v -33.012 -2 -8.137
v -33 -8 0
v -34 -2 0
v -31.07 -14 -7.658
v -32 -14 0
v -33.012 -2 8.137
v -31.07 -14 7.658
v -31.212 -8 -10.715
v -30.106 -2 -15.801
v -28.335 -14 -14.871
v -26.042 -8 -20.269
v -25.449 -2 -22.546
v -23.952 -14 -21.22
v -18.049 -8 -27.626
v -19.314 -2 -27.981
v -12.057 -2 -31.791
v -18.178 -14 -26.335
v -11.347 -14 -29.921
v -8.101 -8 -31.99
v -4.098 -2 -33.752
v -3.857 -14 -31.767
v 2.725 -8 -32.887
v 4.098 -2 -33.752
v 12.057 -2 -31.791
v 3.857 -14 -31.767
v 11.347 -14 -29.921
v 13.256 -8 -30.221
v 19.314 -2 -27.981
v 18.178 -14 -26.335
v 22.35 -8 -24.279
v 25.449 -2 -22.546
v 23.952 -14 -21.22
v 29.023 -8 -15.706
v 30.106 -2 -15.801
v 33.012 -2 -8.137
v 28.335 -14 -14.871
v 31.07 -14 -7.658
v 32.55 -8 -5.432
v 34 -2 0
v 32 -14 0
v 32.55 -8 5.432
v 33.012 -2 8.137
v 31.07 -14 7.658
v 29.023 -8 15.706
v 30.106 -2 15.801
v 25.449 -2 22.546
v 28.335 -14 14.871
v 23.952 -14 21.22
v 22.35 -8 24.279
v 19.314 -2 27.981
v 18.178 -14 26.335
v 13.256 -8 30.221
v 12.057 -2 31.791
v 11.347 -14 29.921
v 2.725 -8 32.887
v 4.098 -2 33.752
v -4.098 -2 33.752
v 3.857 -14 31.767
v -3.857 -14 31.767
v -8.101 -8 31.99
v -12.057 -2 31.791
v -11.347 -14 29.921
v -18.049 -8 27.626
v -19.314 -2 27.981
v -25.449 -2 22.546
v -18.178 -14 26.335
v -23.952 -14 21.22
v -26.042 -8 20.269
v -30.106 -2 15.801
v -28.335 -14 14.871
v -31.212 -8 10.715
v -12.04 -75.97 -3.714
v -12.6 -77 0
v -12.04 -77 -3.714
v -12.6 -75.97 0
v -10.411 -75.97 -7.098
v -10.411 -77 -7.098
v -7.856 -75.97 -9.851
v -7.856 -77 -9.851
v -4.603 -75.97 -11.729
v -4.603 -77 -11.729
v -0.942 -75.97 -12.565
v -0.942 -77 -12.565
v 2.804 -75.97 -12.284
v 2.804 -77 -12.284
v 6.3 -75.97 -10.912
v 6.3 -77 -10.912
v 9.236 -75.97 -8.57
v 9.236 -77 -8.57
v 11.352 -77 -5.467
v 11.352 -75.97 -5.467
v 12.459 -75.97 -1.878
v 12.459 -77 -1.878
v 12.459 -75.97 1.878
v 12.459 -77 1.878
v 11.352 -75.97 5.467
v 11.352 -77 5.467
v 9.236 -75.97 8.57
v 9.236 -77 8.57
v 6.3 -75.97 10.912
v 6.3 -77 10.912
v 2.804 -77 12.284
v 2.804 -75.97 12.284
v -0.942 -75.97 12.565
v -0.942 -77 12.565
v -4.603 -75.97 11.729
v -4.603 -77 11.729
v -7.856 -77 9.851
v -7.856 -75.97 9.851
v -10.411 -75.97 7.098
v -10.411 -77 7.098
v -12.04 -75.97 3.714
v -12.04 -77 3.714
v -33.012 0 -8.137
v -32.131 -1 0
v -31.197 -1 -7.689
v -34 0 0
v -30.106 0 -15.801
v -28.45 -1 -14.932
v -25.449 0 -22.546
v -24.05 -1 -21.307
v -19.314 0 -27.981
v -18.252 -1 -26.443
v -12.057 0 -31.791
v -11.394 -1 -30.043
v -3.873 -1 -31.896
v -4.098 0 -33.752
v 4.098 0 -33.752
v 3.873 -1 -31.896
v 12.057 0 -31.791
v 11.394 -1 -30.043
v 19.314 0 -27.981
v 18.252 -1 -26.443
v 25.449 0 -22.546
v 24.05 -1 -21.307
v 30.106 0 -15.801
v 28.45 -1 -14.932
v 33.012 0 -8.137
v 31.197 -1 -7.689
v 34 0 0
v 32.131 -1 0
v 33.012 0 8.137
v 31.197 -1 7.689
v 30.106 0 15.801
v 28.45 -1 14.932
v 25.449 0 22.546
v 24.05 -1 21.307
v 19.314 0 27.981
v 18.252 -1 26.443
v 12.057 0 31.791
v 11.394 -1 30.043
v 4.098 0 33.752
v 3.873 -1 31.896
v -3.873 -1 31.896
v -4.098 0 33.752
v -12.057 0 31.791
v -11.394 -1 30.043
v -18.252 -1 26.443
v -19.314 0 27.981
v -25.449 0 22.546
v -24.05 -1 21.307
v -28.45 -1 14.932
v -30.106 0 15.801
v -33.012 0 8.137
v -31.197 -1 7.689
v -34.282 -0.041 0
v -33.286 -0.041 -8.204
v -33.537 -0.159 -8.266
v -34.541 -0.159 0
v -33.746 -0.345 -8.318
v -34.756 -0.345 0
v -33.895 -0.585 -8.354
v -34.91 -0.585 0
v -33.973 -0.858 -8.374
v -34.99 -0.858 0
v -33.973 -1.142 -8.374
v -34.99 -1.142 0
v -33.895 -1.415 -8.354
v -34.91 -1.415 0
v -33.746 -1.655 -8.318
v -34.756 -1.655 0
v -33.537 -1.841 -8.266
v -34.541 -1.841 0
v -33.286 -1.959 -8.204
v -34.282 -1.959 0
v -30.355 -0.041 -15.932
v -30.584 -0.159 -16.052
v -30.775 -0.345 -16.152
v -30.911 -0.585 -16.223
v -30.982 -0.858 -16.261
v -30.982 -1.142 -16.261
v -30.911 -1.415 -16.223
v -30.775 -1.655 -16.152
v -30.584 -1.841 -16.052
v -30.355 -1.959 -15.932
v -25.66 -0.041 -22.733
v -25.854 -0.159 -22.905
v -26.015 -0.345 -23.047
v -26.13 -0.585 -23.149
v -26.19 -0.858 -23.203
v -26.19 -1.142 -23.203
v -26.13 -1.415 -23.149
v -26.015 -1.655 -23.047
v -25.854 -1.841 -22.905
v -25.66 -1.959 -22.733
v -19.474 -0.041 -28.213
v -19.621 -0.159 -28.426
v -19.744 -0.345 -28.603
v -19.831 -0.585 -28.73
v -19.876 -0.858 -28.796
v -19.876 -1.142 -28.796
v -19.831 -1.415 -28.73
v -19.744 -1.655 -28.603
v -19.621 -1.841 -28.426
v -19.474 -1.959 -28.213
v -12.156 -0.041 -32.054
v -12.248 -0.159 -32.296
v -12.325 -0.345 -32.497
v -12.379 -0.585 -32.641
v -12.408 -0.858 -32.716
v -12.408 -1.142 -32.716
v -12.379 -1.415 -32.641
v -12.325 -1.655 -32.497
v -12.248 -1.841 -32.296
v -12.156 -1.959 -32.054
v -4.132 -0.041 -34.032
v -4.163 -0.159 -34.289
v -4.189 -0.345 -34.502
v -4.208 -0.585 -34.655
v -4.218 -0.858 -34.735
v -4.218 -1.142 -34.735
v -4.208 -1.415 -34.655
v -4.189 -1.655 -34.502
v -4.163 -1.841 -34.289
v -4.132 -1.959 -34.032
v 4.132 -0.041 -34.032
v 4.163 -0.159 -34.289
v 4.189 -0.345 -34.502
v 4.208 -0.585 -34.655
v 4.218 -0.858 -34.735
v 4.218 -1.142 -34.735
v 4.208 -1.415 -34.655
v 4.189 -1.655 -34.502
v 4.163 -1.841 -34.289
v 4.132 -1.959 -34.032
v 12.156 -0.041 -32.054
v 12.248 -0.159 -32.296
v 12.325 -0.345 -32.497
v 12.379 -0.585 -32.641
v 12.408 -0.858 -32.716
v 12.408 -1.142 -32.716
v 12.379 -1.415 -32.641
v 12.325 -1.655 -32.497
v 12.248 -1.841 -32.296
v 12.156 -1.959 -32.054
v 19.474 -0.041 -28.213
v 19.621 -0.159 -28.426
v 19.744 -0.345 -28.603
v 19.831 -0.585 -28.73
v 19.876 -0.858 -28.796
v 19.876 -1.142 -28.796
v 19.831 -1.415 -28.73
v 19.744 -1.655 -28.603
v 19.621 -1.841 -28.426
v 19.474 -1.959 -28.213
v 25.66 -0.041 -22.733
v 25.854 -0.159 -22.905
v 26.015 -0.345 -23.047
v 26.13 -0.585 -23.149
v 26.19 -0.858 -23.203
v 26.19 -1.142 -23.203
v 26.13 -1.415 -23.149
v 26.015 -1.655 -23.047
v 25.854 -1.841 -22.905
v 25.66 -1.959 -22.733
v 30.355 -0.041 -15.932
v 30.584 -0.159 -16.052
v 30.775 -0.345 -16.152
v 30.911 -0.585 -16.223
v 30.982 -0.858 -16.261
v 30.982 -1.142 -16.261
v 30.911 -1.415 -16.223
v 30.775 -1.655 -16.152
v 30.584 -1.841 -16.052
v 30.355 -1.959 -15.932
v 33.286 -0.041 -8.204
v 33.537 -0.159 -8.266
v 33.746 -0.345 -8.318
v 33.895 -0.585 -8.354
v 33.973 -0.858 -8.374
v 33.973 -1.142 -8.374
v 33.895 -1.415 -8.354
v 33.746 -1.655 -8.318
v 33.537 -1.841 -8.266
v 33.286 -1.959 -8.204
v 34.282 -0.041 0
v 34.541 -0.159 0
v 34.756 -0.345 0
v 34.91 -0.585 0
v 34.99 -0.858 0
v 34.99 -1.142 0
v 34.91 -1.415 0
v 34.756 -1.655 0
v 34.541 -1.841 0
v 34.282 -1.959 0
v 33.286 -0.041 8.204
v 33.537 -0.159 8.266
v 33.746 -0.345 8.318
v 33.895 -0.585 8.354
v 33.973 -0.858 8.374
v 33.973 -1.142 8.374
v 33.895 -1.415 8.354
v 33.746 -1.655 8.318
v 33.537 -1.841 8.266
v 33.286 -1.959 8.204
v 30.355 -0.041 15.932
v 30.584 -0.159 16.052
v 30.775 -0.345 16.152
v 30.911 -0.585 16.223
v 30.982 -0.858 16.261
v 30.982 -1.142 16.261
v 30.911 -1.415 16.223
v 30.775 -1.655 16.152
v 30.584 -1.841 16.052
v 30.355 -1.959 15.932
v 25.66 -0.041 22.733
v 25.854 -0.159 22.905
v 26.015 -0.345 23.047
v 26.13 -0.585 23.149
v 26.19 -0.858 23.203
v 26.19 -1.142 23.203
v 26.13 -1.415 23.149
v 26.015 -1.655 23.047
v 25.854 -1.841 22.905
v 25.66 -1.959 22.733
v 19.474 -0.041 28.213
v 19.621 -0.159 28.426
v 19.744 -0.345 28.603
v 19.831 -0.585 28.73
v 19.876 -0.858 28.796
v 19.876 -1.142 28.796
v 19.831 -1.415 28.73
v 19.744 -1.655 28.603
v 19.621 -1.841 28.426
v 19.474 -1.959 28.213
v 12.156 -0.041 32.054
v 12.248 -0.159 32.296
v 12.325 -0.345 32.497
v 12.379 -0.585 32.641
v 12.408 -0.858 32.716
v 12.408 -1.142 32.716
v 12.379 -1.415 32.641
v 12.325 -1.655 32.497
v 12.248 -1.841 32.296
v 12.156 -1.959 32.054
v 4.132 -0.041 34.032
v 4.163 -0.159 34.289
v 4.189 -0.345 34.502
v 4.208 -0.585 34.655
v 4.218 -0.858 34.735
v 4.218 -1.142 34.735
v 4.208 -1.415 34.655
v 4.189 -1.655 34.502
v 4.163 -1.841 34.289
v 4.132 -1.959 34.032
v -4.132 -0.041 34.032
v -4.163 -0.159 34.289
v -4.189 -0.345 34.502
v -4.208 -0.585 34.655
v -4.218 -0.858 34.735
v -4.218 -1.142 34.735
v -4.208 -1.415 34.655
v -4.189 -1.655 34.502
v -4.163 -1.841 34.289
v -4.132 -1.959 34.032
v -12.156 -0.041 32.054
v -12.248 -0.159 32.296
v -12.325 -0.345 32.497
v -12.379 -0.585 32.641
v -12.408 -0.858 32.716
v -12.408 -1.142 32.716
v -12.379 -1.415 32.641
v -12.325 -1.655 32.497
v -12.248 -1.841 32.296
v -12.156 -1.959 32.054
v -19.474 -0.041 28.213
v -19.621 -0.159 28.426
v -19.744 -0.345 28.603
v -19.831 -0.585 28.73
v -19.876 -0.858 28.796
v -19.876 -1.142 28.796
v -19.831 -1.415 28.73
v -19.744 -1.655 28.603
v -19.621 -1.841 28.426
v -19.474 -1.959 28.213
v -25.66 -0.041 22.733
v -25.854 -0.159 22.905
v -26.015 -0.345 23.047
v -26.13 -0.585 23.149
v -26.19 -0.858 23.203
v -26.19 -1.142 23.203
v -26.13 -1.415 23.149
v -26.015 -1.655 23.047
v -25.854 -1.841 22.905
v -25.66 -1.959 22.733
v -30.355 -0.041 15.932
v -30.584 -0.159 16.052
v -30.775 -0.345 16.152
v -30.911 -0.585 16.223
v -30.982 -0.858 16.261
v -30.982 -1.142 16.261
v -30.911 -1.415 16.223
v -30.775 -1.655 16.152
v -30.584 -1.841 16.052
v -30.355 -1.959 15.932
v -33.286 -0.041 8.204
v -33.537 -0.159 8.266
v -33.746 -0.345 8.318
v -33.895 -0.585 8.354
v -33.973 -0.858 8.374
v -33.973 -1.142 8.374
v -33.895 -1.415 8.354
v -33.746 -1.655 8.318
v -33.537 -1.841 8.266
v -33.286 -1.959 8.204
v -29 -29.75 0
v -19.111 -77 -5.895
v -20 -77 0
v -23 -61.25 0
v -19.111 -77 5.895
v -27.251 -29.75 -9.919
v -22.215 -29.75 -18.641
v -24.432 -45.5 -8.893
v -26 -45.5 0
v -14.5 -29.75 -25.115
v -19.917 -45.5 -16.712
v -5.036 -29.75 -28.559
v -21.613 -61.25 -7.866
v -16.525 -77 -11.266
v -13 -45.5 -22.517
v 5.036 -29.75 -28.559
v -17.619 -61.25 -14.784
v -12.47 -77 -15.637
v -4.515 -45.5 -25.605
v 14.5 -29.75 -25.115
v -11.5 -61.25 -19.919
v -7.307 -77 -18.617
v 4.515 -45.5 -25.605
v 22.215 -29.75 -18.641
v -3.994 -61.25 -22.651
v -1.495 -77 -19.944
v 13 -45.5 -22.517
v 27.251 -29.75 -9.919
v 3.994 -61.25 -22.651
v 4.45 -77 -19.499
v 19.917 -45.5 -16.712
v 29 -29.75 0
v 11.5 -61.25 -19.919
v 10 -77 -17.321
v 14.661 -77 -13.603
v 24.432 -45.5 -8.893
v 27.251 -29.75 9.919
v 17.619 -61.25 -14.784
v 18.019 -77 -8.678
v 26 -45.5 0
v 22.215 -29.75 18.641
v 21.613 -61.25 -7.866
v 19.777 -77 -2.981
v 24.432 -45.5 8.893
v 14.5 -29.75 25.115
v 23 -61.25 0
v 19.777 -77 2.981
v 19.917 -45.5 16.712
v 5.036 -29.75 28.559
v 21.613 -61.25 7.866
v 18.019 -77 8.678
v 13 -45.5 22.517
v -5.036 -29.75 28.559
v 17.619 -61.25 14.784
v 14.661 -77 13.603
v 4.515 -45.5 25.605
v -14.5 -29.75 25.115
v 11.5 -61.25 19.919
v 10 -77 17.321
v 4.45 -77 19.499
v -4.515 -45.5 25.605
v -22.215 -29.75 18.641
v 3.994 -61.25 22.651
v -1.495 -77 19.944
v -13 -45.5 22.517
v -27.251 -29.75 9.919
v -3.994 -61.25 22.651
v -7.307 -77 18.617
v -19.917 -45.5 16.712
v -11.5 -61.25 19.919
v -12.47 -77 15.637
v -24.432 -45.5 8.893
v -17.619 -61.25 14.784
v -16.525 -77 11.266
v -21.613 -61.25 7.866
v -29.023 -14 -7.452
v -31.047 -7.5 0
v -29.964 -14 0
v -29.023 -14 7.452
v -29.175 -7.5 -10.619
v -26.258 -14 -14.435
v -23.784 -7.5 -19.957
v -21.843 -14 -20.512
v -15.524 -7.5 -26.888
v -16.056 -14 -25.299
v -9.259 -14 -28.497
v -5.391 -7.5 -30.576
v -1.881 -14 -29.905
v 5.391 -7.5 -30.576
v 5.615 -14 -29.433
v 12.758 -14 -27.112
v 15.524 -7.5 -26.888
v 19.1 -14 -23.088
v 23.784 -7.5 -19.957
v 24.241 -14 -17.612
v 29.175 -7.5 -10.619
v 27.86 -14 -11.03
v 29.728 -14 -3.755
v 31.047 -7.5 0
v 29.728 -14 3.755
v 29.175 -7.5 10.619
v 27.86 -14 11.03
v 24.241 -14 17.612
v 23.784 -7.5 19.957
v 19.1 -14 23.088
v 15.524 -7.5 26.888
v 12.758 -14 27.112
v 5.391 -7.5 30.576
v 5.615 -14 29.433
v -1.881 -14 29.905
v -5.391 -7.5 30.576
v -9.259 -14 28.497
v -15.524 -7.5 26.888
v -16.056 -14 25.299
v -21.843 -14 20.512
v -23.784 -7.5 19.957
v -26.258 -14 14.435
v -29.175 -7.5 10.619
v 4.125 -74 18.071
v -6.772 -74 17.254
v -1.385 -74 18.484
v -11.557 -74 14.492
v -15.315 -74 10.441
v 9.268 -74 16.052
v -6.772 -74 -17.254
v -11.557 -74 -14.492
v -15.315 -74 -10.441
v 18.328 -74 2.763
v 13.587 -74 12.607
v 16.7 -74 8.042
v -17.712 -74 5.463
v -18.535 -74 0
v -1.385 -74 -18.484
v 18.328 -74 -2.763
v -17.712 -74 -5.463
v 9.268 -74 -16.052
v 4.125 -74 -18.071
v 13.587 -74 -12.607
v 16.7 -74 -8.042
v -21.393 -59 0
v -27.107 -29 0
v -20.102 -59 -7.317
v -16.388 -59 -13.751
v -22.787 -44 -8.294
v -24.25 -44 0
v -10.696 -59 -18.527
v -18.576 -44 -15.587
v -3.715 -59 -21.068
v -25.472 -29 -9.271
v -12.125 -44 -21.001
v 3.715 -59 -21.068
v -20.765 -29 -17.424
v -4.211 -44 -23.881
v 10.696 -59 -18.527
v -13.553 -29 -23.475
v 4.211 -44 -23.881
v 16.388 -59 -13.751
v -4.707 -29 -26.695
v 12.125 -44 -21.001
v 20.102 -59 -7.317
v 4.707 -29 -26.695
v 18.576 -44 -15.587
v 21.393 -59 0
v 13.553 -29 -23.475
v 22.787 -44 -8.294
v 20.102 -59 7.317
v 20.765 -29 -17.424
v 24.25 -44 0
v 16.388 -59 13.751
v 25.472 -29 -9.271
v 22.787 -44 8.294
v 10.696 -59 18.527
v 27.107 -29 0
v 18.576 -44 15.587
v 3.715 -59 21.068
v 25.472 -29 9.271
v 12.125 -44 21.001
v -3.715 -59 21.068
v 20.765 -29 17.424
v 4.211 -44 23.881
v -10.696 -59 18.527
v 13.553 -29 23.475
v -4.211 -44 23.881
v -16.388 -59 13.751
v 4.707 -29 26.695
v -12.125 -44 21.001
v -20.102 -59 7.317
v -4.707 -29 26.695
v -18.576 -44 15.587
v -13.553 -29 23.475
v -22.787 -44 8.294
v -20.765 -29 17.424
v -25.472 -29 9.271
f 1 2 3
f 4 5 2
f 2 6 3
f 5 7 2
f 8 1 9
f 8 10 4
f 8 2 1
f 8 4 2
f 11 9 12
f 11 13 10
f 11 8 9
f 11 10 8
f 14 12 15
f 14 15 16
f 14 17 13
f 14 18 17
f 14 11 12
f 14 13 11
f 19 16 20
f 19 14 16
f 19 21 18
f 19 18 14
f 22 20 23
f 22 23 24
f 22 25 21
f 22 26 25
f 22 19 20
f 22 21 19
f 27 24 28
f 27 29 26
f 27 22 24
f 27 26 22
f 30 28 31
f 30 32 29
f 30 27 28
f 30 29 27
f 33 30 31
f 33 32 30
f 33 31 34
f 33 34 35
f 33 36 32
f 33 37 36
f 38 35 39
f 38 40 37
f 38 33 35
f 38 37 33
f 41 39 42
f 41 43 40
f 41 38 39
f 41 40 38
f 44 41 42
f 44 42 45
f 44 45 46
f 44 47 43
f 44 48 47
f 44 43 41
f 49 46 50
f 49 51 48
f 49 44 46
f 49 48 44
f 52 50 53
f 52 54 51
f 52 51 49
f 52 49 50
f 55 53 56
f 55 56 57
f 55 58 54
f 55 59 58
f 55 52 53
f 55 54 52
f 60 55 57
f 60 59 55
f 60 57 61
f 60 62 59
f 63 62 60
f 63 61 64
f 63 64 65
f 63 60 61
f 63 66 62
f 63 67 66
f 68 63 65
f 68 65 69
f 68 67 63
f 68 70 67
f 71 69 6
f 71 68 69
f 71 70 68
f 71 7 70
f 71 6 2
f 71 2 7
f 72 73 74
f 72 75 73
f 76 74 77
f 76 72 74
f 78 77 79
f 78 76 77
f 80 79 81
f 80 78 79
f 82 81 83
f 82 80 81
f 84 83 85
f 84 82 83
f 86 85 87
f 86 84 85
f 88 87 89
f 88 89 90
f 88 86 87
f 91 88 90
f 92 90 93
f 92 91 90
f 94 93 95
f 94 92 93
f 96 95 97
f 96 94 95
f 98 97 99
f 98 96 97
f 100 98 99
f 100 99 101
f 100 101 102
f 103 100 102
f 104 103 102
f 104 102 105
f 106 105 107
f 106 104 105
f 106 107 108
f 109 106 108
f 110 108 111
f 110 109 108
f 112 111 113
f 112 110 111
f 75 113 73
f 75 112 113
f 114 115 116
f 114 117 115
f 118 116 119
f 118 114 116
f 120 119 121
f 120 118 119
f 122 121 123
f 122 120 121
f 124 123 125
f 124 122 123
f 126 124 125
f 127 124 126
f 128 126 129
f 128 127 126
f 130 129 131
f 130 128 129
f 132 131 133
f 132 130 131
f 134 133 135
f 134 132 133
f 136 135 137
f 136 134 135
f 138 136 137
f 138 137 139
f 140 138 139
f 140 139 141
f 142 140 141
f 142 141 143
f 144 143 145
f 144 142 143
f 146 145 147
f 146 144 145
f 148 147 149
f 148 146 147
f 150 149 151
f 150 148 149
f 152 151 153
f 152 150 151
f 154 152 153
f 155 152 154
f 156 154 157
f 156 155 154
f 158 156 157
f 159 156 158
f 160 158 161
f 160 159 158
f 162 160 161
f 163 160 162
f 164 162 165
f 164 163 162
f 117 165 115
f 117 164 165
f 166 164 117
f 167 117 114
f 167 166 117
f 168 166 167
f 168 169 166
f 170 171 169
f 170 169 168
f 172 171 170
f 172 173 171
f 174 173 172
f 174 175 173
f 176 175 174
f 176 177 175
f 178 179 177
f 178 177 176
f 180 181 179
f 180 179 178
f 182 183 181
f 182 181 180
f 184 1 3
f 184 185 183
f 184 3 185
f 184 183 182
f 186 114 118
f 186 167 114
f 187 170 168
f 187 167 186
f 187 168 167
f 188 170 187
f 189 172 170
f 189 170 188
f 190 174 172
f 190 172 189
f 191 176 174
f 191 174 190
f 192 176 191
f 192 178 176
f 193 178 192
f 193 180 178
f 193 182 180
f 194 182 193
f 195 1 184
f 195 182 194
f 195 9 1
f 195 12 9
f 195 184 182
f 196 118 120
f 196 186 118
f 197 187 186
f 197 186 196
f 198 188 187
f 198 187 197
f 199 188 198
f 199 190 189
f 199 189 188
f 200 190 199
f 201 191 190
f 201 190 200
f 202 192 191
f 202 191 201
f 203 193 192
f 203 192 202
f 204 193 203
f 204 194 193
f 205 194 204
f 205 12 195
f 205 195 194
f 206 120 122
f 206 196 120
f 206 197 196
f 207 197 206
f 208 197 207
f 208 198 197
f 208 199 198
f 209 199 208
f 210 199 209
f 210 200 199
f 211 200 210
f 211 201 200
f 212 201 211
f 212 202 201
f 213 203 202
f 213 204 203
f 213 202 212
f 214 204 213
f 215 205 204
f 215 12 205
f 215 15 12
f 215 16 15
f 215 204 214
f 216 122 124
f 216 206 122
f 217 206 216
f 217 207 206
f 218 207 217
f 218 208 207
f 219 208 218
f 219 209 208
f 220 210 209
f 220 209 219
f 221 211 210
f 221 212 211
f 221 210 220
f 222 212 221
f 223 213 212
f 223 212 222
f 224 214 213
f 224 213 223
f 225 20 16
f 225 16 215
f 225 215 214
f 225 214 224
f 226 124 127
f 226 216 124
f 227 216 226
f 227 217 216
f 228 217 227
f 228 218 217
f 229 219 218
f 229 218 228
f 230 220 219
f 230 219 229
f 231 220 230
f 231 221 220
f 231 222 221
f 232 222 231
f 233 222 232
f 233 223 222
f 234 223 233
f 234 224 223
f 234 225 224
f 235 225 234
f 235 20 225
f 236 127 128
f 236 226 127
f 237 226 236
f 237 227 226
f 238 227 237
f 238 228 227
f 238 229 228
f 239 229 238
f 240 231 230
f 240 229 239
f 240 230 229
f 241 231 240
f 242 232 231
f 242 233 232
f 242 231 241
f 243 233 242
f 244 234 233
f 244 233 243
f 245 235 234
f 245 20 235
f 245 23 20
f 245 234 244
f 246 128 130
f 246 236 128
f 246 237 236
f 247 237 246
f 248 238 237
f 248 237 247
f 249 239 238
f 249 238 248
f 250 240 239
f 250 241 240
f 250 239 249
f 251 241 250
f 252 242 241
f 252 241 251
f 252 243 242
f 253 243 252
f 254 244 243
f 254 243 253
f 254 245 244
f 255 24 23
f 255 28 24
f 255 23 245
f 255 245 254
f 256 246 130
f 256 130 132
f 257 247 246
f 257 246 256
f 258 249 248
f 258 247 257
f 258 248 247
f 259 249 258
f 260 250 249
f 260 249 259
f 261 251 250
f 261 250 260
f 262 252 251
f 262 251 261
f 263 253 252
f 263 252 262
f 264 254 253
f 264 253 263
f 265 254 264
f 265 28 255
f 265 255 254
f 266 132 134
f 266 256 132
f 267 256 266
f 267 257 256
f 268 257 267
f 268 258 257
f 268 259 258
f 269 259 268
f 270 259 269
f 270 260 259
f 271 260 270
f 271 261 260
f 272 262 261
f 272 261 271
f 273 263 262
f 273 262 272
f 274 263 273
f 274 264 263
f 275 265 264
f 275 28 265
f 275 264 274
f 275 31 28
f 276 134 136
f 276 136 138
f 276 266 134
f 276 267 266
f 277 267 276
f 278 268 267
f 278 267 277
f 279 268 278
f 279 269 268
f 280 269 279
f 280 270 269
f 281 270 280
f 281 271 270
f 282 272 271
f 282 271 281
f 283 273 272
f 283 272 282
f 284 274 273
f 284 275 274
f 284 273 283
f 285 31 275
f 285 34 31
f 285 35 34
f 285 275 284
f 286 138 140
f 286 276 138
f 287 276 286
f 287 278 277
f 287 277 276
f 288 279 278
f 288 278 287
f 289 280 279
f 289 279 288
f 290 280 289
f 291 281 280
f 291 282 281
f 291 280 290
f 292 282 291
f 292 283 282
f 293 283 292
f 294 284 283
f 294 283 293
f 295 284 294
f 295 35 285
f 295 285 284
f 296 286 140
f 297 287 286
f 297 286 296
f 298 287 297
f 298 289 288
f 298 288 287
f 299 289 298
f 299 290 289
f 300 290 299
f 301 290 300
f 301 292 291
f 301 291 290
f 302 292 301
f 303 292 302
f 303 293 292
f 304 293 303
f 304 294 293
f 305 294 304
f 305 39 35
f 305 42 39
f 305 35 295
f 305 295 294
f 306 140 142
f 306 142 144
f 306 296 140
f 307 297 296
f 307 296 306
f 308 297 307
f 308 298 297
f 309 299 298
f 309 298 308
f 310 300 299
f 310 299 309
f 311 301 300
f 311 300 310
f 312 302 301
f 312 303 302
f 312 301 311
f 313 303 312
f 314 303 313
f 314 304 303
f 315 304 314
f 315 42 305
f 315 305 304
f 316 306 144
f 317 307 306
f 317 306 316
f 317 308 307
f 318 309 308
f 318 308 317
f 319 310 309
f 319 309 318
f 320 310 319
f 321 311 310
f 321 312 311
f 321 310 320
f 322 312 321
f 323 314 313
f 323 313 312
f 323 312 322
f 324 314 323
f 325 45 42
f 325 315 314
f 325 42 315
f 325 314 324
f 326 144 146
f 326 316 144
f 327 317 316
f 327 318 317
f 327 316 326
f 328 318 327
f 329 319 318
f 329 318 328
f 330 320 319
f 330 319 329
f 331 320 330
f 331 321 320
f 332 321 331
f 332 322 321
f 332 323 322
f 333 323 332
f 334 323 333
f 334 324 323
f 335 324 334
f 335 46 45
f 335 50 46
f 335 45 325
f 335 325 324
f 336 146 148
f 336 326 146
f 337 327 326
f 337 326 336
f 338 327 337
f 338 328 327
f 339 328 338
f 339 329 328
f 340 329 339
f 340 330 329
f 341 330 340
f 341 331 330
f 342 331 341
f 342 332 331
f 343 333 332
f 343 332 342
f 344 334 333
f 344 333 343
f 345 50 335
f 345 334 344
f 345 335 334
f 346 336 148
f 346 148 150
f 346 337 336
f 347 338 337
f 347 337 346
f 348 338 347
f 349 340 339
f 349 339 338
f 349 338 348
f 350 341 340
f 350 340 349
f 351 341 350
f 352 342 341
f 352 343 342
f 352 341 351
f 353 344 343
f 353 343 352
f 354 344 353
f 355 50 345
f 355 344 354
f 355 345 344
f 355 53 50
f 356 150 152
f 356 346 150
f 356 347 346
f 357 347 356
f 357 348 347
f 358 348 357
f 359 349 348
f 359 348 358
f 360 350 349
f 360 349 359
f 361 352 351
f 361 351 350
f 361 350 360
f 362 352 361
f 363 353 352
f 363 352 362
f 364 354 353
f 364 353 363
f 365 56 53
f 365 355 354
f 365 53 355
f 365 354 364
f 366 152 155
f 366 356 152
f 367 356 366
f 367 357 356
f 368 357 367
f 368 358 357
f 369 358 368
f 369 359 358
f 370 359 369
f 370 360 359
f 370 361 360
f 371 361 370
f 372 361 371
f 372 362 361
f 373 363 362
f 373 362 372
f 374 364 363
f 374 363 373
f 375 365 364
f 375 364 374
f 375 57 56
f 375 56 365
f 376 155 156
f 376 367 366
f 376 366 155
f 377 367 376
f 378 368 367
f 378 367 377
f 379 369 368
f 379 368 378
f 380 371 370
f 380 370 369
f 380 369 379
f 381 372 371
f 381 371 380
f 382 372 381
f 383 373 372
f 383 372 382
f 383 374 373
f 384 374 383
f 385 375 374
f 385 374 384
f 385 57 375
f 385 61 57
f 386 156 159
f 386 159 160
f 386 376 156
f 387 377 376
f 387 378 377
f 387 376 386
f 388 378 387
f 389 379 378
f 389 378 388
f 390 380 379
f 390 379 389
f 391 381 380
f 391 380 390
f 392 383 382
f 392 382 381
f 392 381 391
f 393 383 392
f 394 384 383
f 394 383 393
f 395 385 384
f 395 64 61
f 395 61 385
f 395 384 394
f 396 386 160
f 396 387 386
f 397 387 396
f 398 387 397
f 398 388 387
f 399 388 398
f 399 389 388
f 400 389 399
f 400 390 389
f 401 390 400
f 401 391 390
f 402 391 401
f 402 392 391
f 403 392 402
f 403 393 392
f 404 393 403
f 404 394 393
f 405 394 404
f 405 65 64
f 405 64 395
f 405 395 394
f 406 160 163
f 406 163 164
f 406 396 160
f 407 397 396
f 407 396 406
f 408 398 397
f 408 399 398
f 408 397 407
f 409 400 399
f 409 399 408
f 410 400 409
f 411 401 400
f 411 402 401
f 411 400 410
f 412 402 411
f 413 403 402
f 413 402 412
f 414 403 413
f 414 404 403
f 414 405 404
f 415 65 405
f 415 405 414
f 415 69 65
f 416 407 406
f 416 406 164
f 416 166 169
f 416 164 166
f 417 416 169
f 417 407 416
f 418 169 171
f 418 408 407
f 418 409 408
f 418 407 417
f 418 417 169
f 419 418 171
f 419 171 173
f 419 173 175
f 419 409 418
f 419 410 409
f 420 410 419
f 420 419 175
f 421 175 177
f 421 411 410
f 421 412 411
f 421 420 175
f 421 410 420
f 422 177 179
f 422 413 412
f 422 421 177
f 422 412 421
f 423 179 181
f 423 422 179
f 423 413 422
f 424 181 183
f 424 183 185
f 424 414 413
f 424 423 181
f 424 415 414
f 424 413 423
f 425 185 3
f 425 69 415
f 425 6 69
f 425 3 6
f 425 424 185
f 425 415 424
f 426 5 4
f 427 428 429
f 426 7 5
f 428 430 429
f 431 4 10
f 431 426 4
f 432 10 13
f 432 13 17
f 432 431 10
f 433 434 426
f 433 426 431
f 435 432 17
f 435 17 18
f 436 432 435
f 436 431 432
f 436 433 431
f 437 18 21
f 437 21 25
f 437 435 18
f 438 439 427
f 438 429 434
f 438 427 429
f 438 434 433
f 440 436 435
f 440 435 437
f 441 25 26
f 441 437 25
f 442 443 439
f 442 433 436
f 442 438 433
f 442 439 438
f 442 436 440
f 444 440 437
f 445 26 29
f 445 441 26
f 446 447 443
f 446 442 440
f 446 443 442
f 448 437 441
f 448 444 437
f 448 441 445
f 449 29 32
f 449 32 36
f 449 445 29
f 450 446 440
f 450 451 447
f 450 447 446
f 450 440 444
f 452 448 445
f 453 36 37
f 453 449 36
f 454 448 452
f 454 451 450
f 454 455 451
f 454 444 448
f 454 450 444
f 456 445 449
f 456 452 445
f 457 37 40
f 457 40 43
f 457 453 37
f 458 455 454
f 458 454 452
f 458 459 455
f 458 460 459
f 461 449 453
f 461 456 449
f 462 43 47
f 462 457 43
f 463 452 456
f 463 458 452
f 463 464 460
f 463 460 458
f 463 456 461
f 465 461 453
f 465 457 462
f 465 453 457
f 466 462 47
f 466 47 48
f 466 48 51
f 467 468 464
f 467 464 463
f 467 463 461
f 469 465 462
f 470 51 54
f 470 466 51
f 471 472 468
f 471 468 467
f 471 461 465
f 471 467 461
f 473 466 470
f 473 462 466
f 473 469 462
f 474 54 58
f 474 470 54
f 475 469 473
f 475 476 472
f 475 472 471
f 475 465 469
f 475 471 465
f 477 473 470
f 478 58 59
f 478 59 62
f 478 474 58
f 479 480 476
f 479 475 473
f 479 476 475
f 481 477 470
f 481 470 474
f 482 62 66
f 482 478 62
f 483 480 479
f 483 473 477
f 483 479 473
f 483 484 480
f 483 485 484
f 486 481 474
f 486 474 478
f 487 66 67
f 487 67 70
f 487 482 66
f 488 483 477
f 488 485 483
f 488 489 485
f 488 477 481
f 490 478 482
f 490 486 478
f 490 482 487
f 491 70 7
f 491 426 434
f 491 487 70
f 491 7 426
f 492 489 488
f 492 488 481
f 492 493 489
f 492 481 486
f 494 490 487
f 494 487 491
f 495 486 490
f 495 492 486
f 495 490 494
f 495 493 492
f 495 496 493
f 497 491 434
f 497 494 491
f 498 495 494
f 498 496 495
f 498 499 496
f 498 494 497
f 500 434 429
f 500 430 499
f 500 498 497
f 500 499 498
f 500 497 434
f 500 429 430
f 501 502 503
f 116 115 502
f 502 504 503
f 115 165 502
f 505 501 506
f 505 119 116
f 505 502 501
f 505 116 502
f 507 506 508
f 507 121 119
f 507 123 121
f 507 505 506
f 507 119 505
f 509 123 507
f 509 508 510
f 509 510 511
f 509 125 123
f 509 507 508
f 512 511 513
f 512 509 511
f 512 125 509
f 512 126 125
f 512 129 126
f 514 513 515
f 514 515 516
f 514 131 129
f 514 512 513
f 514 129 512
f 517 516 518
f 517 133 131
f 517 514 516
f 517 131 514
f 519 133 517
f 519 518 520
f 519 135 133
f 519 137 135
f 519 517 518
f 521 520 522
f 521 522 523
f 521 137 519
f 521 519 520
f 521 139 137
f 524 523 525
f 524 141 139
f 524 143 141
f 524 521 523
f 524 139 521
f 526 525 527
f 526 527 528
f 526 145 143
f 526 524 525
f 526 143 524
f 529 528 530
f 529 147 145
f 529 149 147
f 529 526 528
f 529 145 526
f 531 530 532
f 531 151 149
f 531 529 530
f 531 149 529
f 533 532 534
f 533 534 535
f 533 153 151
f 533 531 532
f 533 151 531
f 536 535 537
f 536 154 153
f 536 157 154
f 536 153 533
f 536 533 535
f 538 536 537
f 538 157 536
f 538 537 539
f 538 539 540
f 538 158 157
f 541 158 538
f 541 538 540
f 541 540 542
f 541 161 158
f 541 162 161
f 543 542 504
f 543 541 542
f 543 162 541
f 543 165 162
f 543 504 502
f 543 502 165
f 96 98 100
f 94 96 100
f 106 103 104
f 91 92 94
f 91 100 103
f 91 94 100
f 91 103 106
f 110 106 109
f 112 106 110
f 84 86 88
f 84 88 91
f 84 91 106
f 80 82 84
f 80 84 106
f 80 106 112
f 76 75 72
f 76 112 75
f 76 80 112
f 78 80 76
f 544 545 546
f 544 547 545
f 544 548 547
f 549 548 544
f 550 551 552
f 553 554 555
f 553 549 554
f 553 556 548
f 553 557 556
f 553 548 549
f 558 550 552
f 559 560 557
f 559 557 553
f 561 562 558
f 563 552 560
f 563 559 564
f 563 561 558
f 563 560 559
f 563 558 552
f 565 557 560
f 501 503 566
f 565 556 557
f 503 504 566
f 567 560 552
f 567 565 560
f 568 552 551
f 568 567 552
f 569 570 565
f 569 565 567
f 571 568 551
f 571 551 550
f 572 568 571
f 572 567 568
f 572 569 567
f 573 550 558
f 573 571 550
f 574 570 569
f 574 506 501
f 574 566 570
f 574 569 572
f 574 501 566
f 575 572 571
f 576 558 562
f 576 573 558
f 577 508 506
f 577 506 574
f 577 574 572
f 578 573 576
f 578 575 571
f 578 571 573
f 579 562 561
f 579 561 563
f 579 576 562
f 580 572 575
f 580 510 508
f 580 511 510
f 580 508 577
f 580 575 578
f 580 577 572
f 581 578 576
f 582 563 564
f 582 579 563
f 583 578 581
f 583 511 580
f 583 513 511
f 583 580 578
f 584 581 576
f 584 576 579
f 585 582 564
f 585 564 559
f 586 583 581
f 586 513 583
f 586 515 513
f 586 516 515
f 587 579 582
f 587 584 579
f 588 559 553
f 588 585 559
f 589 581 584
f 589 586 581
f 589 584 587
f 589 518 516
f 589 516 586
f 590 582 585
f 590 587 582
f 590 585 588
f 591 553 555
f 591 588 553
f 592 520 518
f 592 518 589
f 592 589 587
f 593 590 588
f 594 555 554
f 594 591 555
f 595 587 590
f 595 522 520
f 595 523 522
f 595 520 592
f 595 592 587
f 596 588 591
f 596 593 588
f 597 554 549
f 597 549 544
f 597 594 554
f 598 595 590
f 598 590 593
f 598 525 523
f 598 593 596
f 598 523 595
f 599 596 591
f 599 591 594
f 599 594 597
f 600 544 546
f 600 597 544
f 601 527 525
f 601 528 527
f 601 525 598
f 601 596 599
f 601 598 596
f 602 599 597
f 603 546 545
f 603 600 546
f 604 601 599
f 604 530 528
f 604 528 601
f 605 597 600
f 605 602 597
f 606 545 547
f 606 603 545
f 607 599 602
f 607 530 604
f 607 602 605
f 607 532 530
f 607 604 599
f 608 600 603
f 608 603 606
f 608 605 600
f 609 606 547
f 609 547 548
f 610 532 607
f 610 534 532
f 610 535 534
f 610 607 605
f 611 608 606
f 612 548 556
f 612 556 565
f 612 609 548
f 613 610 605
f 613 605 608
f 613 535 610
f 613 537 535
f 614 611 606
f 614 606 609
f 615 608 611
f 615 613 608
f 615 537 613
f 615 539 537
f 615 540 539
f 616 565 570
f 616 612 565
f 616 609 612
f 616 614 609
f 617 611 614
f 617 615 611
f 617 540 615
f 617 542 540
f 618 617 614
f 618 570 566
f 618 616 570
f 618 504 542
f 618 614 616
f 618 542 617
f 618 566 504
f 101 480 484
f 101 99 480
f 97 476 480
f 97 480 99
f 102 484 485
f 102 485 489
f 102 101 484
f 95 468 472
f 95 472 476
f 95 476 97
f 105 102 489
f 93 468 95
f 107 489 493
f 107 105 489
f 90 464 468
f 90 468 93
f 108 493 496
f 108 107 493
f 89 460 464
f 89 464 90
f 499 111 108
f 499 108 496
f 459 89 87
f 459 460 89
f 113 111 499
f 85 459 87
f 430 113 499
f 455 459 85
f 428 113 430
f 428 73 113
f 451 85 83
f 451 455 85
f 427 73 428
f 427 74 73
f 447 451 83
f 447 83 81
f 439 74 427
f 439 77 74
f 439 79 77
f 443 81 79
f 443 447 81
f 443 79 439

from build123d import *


with BuildPart() as part:
    # Sketch1 → Revolve1 (revolve)
    with BuildSketch(Plane.XY):
        with BuildLine():
            Line((-32.130708731, -1), (-34, 0))
            ThreePointArc((-34, 0), (-35, -1), (-34, -2))
            Line((-34, -2), (-32, -14))
            Line((-32, -14), (-20, -77))
            Line((-20, -77), (-12.6, -77))
            Line((-12.6, -77), (-12.6, -75.97))
            Line((-12.6, -75.97), (0, -75.97))
            Line((0, -75.97), (0, -74))
            Line((0, -74), (-18.535470636, -74))
            Line((-18.535470636, -74), (-29.964042064, -14))
            Line((-29.964042064, -14), (-32.130708731, -1))
        make_face()
    revolve(axis=Axis((0, 0, 0), (0, -1, 0)))


solid = part.part
